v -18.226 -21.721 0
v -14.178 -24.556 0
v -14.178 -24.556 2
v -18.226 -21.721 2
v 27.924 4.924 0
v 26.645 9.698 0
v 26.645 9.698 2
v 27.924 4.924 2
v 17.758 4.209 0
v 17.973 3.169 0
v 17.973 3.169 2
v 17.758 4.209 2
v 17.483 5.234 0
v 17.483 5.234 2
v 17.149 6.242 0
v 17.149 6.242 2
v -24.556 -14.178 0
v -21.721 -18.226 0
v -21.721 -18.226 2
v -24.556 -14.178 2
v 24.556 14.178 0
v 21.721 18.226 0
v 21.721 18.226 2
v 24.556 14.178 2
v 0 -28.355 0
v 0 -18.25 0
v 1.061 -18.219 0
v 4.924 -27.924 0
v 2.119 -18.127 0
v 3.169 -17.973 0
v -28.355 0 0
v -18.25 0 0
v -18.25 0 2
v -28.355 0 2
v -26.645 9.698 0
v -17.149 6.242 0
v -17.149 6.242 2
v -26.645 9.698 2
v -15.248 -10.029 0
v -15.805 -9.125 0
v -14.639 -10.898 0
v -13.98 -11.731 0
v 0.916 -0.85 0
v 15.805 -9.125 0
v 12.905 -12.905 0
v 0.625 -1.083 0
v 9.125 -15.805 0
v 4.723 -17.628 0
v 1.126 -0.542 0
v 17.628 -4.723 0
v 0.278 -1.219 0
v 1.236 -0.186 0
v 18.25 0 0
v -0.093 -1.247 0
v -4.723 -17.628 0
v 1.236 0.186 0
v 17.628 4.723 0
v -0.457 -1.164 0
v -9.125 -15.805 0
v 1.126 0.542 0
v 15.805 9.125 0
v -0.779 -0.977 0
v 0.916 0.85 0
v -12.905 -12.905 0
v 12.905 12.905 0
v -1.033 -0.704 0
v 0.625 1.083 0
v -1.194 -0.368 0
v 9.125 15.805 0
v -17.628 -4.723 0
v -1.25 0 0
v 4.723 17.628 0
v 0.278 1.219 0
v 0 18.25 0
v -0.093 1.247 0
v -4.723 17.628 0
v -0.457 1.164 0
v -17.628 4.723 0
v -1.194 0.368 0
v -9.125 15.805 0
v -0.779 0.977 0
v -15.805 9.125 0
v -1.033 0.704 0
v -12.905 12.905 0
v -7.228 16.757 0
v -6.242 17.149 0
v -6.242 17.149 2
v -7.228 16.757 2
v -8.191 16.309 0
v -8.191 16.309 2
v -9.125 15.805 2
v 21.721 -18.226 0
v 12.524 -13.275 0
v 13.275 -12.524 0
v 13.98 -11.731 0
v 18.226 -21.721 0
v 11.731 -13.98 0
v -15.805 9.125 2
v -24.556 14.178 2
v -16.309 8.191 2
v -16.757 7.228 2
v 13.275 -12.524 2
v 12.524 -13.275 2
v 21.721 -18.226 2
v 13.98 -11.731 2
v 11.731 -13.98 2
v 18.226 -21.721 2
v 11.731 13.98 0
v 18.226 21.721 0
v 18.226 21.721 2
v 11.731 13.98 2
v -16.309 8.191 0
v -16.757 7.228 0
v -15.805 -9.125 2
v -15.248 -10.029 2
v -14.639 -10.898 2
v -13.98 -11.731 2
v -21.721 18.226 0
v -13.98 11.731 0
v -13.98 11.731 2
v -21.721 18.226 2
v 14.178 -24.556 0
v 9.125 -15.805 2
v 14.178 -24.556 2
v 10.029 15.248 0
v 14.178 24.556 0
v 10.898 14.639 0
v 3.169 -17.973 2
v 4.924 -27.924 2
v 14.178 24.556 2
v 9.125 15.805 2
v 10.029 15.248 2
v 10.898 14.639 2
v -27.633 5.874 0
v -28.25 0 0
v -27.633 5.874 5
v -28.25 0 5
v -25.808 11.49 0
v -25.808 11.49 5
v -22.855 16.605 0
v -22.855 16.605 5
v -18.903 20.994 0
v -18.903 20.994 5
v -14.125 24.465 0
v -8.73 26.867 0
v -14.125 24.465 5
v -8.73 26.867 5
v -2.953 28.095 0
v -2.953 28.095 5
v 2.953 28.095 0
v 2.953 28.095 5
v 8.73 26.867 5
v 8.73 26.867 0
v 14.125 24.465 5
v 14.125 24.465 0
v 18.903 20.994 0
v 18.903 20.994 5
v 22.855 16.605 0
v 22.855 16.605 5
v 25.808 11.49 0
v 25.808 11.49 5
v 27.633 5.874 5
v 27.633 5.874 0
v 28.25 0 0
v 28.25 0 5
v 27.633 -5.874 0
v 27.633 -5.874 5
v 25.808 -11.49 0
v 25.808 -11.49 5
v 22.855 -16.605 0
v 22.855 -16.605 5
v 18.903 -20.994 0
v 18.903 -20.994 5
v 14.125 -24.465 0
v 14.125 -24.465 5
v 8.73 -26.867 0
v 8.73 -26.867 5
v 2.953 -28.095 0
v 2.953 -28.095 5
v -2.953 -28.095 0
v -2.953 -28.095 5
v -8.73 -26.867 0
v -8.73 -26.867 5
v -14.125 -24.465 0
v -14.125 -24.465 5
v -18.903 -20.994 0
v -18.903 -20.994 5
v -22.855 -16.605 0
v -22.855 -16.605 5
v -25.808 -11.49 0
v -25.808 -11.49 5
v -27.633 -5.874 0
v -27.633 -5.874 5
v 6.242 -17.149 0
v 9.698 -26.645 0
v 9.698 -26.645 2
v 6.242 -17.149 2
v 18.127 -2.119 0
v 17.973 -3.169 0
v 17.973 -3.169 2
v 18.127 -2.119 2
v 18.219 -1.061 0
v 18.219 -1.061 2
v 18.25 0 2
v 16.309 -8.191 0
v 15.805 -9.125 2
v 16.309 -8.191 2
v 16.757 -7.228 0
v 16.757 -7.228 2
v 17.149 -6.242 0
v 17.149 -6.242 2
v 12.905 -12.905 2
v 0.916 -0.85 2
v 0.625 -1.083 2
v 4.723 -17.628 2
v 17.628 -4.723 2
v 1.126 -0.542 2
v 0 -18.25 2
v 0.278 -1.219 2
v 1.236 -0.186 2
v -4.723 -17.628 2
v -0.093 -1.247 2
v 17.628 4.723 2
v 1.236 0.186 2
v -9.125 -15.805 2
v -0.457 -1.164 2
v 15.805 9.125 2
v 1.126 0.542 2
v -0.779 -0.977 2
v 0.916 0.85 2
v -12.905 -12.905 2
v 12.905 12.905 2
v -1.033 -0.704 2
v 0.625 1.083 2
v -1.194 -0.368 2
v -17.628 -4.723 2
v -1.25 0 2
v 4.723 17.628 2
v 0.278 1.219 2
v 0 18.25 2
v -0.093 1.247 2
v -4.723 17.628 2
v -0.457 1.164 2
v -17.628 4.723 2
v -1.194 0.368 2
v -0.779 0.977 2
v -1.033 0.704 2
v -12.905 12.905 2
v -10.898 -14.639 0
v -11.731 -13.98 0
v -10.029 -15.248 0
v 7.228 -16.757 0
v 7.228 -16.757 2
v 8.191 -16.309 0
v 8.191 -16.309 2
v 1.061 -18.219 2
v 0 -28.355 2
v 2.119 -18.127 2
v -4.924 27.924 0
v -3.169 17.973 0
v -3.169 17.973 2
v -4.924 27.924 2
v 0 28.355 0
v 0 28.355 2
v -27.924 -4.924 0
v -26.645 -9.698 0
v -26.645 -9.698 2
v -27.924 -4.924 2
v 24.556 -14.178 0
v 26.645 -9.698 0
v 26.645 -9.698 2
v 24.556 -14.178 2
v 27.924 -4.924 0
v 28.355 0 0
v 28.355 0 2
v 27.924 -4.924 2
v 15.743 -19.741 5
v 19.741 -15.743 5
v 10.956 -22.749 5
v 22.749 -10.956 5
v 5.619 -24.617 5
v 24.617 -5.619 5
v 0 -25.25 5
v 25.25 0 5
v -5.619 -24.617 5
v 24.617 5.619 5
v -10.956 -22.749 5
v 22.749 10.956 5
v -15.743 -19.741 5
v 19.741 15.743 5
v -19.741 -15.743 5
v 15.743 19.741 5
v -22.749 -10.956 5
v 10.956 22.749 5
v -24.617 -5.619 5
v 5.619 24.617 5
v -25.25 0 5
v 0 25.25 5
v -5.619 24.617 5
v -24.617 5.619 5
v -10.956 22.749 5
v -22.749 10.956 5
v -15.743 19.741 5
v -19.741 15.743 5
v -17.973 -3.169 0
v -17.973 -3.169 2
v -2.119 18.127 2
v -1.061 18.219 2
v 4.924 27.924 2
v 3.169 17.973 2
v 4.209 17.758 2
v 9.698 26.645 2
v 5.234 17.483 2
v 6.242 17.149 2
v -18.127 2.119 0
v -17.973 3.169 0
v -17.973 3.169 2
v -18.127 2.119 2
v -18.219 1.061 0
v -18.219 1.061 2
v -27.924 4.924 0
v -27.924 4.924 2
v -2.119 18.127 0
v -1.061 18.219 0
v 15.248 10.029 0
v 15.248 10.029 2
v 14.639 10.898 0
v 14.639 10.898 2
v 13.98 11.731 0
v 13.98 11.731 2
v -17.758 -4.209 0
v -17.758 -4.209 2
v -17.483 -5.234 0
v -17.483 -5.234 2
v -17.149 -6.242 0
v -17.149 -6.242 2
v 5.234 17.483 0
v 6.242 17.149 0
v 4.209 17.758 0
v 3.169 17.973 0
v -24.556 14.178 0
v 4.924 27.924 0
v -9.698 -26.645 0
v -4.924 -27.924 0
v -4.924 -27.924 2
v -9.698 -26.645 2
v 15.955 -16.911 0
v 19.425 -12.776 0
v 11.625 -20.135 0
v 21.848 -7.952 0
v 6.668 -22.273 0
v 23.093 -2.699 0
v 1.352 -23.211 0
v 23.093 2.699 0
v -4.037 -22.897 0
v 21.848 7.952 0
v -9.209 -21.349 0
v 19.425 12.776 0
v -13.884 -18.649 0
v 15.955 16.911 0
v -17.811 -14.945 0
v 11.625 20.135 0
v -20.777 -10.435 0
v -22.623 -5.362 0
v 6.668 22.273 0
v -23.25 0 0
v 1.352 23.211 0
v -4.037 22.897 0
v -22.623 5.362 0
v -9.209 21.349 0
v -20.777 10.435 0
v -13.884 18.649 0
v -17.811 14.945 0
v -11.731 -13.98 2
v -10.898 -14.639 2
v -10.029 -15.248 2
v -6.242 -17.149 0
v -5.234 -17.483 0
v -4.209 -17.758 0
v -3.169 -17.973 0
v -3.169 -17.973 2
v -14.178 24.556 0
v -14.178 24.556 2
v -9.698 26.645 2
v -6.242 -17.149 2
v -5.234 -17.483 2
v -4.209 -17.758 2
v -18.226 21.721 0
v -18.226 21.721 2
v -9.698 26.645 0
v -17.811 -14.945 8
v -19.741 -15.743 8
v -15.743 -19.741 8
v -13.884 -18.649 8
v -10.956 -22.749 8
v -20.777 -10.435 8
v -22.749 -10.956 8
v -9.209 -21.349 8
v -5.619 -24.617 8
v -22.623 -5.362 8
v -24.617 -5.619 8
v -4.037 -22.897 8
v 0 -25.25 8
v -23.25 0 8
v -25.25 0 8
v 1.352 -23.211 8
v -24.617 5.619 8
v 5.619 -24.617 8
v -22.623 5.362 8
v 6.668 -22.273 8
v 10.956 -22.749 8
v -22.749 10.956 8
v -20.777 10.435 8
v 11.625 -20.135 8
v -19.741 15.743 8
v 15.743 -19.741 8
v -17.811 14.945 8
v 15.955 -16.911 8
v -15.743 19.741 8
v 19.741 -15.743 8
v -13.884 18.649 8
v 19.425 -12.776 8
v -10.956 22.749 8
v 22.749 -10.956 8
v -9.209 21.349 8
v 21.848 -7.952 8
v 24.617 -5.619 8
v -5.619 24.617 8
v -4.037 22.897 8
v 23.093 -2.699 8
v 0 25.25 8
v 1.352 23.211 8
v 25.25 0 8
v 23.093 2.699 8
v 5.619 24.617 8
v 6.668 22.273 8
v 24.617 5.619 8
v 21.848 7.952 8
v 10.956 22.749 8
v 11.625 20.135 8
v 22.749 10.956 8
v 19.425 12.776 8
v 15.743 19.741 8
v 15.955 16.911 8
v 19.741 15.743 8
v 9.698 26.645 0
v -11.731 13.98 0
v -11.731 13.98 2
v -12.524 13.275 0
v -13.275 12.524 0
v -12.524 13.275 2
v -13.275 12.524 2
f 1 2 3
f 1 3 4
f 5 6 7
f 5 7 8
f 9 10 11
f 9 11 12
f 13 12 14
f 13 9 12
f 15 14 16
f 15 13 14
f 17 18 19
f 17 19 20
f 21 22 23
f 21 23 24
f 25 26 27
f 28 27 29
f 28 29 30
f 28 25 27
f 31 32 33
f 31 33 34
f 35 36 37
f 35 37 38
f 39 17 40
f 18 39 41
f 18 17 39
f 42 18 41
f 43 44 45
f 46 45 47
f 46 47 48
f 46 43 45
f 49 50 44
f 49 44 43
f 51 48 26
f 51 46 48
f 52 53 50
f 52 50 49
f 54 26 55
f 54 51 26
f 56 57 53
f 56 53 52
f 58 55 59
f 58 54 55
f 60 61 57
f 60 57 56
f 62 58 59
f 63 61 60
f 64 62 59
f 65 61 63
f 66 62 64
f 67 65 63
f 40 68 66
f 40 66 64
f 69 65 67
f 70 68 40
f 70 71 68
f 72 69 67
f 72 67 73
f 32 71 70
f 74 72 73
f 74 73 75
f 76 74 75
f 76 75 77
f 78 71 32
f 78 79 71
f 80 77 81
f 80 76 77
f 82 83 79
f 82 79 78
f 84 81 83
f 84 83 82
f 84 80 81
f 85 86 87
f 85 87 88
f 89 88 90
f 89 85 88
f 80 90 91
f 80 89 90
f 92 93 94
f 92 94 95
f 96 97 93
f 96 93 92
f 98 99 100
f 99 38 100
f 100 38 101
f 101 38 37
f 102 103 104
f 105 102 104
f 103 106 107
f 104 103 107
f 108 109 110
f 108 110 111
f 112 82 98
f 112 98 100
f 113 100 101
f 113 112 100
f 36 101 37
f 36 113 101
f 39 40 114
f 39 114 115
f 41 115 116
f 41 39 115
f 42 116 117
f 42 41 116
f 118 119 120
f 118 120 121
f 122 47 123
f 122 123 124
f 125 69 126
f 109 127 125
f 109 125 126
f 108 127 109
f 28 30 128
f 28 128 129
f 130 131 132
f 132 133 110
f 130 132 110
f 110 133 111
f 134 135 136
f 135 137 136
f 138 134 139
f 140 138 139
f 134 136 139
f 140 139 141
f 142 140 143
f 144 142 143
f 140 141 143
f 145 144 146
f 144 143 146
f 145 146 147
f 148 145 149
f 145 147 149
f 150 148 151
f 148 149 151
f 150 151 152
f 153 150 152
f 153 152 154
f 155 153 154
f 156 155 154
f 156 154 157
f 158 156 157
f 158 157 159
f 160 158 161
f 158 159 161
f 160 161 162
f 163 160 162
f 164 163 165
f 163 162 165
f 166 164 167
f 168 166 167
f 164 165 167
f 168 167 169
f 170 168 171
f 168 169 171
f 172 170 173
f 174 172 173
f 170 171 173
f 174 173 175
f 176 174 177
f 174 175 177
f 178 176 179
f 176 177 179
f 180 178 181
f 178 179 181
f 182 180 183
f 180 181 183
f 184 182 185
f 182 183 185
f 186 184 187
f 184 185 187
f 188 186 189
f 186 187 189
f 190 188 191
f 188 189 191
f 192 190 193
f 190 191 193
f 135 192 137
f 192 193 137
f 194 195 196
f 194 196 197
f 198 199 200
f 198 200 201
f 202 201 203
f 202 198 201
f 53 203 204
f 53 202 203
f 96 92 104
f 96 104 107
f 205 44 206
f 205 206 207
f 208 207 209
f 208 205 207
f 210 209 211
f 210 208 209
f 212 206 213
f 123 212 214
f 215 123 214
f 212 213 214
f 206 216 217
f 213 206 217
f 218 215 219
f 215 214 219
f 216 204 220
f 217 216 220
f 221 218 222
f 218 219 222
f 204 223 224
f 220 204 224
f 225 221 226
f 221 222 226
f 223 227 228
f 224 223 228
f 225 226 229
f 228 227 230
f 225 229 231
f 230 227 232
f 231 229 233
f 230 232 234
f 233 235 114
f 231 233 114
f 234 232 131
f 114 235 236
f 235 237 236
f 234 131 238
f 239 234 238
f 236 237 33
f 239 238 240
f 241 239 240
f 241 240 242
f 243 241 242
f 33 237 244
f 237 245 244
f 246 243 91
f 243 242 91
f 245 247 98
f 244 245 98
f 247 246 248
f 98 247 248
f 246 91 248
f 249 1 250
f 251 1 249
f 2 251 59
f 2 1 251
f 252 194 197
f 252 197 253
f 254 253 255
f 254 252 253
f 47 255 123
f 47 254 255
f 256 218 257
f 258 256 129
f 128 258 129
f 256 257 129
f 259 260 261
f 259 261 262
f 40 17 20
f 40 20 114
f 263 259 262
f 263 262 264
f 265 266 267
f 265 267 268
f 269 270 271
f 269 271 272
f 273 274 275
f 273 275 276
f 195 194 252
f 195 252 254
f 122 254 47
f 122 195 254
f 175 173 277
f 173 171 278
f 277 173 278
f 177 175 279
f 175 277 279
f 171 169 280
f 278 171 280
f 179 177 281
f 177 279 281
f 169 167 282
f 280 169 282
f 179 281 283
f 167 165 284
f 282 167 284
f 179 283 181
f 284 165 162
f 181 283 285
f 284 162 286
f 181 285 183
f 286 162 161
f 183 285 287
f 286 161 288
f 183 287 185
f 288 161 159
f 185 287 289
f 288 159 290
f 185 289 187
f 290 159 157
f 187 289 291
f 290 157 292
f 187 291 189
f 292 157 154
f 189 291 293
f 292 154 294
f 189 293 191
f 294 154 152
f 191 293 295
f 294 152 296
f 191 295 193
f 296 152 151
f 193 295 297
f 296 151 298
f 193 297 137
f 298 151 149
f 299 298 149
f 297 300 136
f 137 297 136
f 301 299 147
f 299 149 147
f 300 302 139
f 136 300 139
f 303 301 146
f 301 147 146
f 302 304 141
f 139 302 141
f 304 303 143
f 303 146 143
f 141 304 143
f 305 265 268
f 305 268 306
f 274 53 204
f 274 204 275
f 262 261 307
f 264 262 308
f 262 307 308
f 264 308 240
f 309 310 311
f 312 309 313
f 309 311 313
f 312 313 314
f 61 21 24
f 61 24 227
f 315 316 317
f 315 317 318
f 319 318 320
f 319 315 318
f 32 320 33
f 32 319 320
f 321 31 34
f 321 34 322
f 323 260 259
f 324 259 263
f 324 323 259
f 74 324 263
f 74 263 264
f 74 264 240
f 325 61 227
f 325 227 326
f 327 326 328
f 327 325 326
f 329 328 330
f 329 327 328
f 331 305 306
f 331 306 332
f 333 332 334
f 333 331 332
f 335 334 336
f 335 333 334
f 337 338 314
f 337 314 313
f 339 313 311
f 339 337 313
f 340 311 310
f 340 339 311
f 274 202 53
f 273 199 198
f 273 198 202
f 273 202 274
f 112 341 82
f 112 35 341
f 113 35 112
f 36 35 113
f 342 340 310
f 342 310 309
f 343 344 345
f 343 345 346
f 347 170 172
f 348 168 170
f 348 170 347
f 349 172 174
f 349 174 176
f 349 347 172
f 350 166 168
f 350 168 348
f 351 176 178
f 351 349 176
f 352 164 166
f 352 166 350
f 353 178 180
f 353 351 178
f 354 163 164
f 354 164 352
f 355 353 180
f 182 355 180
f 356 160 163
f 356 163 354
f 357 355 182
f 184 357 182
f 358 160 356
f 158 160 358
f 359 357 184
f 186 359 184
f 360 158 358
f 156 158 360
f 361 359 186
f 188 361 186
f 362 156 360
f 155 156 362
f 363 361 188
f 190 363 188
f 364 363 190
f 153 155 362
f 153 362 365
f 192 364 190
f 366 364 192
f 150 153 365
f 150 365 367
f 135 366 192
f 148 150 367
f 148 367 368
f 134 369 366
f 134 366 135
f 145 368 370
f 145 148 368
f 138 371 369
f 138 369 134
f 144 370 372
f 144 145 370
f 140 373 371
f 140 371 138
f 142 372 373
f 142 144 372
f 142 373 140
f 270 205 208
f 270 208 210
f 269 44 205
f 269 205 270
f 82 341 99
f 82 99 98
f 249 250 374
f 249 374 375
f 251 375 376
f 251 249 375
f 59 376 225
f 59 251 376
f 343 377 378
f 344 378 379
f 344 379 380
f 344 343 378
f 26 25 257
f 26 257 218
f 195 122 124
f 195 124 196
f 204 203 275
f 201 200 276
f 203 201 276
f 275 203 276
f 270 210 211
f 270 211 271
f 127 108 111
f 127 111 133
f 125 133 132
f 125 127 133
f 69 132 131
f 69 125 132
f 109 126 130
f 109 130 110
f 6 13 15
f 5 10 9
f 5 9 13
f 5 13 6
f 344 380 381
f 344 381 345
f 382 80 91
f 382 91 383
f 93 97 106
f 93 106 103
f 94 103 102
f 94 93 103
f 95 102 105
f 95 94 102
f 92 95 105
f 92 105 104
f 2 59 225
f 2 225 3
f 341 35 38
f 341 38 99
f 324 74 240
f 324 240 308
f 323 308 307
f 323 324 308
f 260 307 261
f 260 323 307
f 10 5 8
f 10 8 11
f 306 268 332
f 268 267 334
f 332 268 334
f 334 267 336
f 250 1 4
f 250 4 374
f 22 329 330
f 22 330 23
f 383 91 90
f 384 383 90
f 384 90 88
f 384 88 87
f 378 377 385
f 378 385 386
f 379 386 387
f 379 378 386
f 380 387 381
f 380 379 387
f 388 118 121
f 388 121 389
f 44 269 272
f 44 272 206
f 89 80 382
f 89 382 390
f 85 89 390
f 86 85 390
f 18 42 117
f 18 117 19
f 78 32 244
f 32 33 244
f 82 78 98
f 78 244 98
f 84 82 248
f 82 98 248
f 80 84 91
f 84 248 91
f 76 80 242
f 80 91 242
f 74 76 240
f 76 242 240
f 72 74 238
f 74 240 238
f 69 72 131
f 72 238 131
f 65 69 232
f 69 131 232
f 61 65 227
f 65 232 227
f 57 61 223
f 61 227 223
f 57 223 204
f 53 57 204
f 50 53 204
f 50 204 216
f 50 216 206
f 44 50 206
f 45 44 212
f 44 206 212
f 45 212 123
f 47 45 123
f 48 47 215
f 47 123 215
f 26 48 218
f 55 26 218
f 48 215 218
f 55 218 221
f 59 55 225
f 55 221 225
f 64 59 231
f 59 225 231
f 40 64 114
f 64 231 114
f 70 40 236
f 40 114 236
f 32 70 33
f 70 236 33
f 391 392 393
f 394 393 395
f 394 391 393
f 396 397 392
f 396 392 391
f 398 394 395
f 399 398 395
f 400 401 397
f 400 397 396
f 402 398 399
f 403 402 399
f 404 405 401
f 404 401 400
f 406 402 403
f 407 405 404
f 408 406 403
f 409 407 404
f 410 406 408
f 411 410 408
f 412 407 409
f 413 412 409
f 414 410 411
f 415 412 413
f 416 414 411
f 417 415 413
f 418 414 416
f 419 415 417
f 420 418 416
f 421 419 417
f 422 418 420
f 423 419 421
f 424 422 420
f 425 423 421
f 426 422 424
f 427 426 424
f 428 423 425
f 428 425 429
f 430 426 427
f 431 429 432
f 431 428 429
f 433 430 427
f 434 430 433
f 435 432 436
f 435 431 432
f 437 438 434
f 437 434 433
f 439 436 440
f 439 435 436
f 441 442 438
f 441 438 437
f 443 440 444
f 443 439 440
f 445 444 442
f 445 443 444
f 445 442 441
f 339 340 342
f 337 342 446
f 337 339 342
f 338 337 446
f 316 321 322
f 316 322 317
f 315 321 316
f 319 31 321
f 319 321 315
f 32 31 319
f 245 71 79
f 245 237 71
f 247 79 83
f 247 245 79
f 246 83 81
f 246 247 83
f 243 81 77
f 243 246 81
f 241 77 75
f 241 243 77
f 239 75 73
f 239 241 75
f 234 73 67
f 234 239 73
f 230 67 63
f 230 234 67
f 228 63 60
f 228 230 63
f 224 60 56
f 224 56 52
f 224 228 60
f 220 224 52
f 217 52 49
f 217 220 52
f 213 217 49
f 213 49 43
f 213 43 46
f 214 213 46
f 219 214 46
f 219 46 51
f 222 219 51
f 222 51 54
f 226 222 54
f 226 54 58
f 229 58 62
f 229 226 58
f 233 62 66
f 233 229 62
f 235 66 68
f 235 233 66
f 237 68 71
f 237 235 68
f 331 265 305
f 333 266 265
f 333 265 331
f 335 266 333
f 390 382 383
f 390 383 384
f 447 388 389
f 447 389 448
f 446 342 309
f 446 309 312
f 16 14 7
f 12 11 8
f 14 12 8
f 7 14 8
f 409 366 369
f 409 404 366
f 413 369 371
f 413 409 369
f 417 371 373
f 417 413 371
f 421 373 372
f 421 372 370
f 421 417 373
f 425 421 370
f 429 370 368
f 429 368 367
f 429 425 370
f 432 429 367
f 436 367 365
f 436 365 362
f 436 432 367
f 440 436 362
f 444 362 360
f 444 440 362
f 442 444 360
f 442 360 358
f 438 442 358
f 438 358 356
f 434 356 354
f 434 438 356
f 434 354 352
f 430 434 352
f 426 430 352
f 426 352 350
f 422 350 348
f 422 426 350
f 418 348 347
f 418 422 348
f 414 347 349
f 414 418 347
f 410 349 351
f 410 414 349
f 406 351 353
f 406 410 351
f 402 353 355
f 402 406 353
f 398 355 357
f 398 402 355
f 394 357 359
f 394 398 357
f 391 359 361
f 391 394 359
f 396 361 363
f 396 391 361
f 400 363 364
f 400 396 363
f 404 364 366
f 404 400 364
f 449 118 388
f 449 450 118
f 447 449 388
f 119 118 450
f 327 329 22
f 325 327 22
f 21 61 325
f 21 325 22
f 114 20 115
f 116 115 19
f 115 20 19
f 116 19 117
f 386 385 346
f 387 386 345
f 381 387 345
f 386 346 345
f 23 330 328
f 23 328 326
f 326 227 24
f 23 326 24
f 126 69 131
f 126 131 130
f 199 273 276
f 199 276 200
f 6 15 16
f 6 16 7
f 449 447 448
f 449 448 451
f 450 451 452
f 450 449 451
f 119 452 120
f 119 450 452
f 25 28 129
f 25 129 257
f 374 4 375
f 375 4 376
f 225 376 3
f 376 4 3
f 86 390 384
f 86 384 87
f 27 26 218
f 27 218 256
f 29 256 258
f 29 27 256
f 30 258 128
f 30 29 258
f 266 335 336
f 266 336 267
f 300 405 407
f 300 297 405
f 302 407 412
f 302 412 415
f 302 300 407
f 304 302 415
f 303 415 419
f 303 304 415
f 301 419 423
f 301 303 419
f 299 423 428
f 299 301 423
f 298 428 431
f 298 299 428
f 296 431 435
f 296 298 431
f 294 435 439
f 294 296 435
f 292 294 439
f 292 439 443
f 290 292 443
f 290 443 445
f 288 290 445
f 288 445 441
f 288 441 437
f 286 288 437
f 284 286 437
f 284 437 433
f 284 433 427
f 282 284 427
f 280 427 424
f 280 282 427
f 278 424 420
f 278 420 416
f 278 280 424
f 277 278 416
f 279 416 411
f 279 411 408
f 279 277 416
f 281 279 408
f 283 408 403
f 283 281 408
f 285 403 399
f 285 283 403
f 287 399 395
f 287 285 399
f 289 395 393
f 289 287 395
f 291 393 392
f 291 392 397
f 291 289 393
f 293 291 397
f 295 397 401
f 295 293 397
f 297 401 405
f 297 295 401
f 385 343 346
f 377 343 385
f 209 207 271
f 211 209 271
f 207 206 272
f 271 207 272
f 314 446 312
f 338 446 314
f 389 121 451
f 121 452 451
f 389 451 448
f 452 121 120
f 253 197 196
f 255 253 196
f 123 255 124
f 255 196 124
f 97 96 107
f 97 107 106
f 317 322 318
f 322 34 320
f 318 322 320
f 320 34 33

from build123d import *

# Parameters (mm, degrees)
F0_W     = 17
F0_H     = 2
F0_W_2   = 3
F0_H_2   = 5
F3_DEPTH = 2


with BuildPart() as f1:
    # F0 (on Front) → F1 (revolve)
    with BuildSketch(Plane.XZ):
        with Locations((-9.75, 1)):
            Rectangle(F0_W, F0_H)
        Polygon((-25.25, 0), (-23.25, 0), (-23.25, 8), (-25.25, 8), (-25.25, 5), align=None)
        with Locations((-26.75, 2.5)):
            Rectangle(F0_W_2, F0_H_2)
    revolve(axis=Axis((0, 0, -5.287794), (0, 0, -1)))


with BuildPart() as f3:
    # F2 (on face) → F3 (new body)
    with BuildSketch(Plane(origin=(0, 0, 0), x_dir=(1, 0, 0), z_dir=(0, 0, -1))):
        with BuildLine():
            ThreePointArc((11.730874, -13.980311), (10.46777, -14.949525), (9.125, -15.804964))
            Line((9.125, -15.804964), (14.177606, -24.556333))
            Line((14.177606, -24.556333), (18.226378, -21.721352))
            Line((18.226378, -21.721352), (11.730874, -13.980311))
        make_face()
        with BuildLine():
            ThreePointArc((6.241868, -17.14939), (4.723448, -17.628146), (3.169079, -17.972741))
            Line((3.169079, -17.972741), (4.923831, -27.924432))
            Line((4.923831, -27.924432), (9.698053, -26.645183))
            Line((9.698053, -26.645183), (6.241868, -17.14939))
        make_face()
        with BuildLine():
            Line((0, -28.355211), (0, -18.25))
            ThreePointArc((0, -18.25), (-1.590592, -18.180553), (-3.169079, -17.972741))
            Line((-3.169079, -17.972741), (-4.923831, -27.924432))
            Line((-4.923831, -27.924432), (0, -28.355211))
        make_face()
        with BuildLine():
            Line((-9.698053, -26.645183), (-6.241868, -17.14939))
            ThreePointArc((-6.241868, -17.14939), (-7.712783, -16.540117), (-9.125, -15.804964))
            Line((-9.125, -15.804964), (-14.177606, -24.556333))
            Line((-14.177606, -24.556333), (-9.698053, -26.645183))
        make_face()
        with BuildLine():
            Line((-18.226378, -21.721352), (-11.730874, -13.980311))
            ThreePointArc((-11.730874, -13.980311), (-12.904699, -12.904699), (-13.980311, -11.730874))
            Line((-13.980311, -11.730874), (-21.721352, -18.226378))
            Line((-21.721352, -18.226378), (-18.226378, -21.721352))
        make_face()
        with BuildLine():
            Line((-24.556333, -14.177606), (-15.804964, -9.125))
            ThreePointArc((-15.804964, -9.125), (-16.540117, -7.712783), (-17.14939, -6.241868))
            Line((-17.14939, -6.241868), (-26.645183, -9.698053))
            Line((-26.645183, -9.698053), (-24.556333, -14.177606))
        make_face()
        with BuildLine():
            Line((-27.924432, -4.923831), (-17.972741, -3.169079))
            ThreePointArc((-17.972741, -3.169079), (-18.180553, -1.590592), (-18.25, 0))
            Line((-18.25, 0), (-28.355211, 0))
            Line((-28.355211, 0), (-27.924432, -4.923831))
        make_face()
        with BuildLine():
            Line((-27.924432, 4.923831), (-17.972741, 3.169079))
            ThreePointArc((-17.972741, 3.169079), (-17.628146, 4.723448), (-17.14939, 6.241868))
            Line((-17.14939, 6.241868), (-26.645183, 9.698053))
            Line((-26.645183, 9.698053), (-27.924432, 4.923831))
        make_face()
        with BuildLine():
            Line((-24.556333, 14.177606), (-15.804964, 9.125))
            ThreePointArc((-15.804964, 9.125), (-14.949525, 10.46777), (-13.980311, 11.730874))
            Line((-13.980311, 11.730874), (-21.721352, 18.226378))
            Line((-21.721352, 18.226378), (-24.556333, 14.177606))
        make_face()
        with BuildLine():
            Line((-18.226378, 21.721352), (-11.730874, 13.980311))
            ThreePointArc((-11.730874, 13.980311), (-10.46777, 14.949525), (-9.125, 15.804964))
            Line((-9.125, 15.804964), (-14.177606, 24.556333))
            Line((-14.177606, 24.556333), (-18.226378, 21.721352))
        make_face()
        with BuildLine():
            Line((-9.698053, 26.645183), (-6.241868, 17.14939))
            ThreePointArc((-6.241868, 17.14939), (-4.723448, 17.628146), (-3.169079, 17.972741))
            Line((-3.169079, 17.972741), (-4.923831, 27.924432))
            Line((-4.923831, 27.924432), (-9.698053, 26.645183))
        make_face()
        with BuildLine():
            ThreePointArc((0, 18.25), (1.590592, 18.180553), (3.169079, 17.972741))
            Line((3.169079, 17.972741), (4.923831, 27.924432))
            Line((4.923831, 27.924432), (0, 28.355211))
            Line((0, 28.355211), (0, 18.25))
        make_face()
        with BuildLine():
            ThreePointArc((6.241868, 17.14939), (7.712783, 16.540117), (9.125, 15.804964))
            Line((9.125, 15.804964), (14.177606, 24.556333))
            Line((14.177606, 24.556333), (9.698053, 26.645183))
            Line((9.698053, 26.645183), (6.241868, 17.14939))
        make_face()
        with BuildLine():
            ThreePointArc((11.730874, 13.980311), (12.904699, 12.904699), (13.980311, 11.730874))
            Line((13.980311, 11.730874), (21.721352, 18.226378))
            Line((21.721352, 18.226378), (18.226378, 21.721352))
            Line((18.226378, 21.721352), (11.730874, 13.980311))
        make_face()
        with BuildLine():
            ThreePointArc((15.804964, 9.125), (16.540117, 7.712783), (17.14939, 6.241868))
            Line((17.14939, 6.241868), (26.645183, 9.698053))
            Line((26.645183, 9.698053), (24.556333, 14.177606))
            Line((24.556333, 14.177606), (15.804964, 9.125))
        make_face()
        with BuildLine():
            ThreePointArc((17.972741, 3.169079), (18.180553, 1.590592), (18.25, 0))
            Line((18.25, 0), (28.355211, 0))
            Line((28.355211, 0), (27.924432, 4.923831))
            Line((27.924432, 4.923831), (17.972741, 3.169079))
        make_face()
        with BuildLine():
            ThreePointArc((17.972741, -3.169079), (17.628146, -4.723448), (17.14939, -6.241868))
            Line((17.14939, -6.241868), (26.645183, -9.698053))
            Line((26.645183, -9.698053), (27.924432, -4.923831))
            Line((27.924432, -4.923831), (17.972741, -3.169079))
        make_face()
        with BuildLine():
            ThreePointArc((15.804964, -9.125), (14.949525, -10.46777), (13.980311, -11.730874))
            Line((13.980311, -11.730874), (21.721352, -18.226378))
            Line((21.721352, -18.226378), (24.556333, -14.177606))
            Line((24.556333, -14.177606), (15.804964, -9.125))
        make_face()
    extrude(amount=-F3_DEPTH)


solid = Compound([f1.part, f3.part])
